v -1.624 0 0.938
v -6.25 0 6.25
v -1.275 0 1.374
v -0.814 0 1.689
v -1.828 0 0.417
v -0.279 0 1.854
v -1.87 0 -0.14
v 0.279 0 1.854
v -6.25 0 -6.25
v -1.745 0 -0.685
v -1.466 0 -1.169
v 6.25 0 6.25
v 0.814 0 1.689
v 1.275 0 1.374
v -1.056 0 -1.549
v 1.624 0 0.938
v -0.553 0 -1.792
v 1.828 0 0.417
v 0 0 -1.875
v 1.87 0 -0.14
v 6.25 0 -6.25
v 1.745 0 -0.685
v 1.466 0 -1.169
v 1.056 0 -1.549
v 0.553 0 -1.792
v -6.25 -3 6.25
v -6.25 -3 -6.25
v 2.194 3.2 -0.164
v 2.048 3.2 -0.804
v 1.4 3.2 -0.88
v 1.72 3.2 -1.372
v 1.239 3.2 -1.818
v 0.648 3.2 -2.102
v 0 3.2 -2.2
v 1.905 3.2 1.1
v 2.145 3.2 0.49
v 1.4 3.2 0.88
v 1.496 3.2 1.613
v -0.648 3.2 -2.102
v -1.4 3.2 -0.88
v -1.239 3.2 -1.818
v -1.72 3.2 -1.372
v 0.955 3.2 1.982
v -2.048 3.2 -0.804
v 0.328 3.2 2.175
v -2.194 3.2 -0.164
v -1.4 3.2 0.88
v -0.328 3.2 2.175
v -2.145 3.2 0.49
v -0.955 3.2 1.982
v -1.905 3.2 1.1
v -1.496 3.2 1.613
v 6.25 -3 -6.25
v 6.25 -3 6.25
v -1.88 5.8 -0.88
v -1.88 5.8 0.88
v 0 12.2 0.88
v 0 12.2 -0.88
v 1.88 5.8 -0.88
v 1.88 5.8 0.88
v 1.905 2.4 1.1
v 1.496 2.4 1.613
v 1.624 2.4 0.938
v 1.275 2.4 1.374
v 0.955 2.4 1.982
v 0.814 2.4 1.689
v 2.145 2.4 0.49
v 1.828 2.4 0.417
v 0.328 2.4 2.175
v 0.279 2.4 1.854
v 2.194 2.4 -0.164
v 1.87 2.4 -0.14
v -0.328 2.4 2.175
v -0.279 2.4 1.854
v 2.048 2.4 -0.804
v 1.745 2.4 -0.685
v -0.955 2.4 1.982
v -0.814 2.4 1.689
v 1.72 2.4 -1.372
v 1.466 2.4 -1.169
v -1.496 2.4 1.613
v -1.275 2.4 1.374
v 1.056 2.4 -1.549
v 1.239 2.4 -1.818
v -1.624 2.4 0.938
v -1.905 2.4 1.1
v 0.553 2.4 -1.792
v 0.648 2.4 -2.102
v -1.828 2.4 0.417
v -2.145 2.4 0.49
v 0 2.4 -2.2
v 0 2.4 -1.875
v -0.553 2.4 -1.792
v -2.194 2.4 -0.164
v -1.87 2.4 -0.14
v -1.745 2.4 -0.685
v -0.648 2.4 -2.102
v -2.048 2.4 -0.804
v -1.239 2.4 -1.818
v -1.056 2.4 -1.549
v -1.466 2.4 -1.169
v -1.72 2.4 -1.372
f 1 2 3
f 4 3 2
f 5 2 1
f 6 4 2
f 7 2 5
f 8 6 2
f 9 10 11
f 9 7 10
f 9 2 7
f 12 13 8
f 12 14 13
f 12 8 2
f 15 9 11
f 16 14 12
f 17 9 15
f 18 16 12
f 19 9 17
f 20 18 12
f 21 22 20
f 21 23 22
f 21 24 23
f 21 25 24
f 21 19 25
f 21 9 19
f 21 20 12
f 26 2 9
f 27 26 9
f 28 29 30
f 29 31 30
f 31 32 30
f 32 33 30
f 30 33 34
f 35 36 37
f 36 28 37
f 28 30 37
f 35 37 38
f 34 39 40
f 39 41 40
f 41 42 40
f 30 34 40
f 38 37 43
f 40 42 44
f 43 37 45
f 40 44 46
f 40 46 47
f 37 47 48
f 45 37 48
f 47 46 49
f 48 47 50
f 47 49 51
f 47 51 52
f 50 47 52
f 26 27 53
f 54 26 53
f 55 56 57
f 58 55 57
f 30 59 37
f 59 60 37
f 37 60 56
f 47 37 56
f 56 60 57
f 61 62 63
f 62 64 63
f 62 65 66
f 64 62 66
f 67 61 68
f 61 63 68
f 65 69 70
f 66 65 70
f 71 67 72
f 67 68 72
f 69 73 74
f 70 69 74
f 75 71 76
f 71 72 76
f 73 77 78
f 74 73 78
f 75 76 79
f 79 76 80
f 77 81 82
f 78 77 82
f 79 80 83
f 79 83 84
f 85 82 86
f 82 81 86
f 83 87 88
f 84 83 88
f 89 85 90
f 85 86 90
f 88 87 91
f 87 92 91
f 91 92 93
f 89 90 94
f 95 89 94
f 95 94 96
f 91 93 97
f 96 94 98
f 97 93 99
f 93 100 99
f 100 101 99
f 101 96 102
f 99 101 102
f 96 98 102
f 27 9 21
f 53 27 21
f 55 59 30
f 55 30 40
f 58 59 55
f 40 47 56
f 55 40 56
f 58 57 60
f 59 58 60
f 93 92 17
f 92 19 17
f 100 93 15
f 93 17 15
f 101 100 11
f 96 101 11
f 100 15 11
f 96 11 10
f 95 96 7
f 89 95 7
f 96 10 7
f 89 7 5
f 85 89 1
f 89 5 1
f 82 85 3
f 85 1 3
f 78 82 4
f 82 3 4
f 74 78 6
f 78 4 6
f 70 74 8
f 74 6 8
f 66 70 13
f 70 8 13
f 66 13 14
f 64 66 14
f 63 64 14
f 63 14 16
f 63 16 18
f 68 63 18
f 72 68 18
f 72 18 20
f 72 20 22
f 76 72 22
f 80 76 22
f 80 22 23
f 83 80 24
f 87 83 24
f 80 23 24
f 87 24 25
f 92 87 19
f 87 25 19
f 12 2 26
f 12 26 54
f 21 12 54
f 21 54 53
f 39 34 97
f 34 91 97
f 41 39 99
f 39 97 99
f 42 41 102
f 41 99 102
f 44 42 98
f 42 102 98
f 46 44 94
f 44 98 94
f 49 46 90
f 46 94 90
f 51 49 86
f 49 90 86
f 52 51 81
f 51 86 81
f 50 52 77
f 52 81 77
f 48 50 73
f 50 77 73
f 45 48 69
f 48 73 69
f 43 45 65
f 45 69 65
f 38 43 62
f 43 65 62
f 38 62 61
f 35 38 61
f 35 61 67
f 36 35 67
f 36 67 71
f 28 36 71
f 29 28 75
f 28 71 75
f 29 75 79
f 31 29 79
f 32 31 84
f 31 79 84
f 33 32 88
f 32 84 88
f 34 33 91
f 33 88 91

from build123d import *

# Parameters (mm, degrees)
SKETCH2_W           = 12.5
SKETCH2_H           = 12.5
BOSS_EXTRUDE1_DEPTH = 3
BOSS_EXTRUDE2_DEPTH = 0.88


with BuildPart() as part:
    # Sketch2 → Boss-Extrude1 (new body)
    with BuildSketch(Plane(origin=(0, 0, 0), x_dir=(1, 0, 0), z_dir=(0, 1, 0))):
        Rectangle(SKETCH2_W, SKETCH2_H)
    extrude(amount=-BOSS_EXTRUDE1_DEPTH)

    # Sketch3 → Revolve1 (revolve)
    with BuildSketch(Plane.XY, mode=Mode.PRIVATE) as revolve1_sk:
        Polygon((0, 3.2), (2.2, 3.2), (2.2, 2.4), (1.875, 2.4), (1.875, 0), (0, 0), align=None)
    revolve(revolve1_sk.sketch.rotate(Axis((0, -3, 0), (0, 1, 0)), 90), axis=Axis((0, -3, 0), (0, 1, 0)))

    # Sketch4 → Boss-Extrude2 (add, symmetric)
    with BuildSketch(Plane.XY):
        Polygon((0, 12.2), (1.88, 5.8), (1.4, 3.2), (-1.4, 3.2), (-1.88, 5.8), align=None)
    extrude(amount=BOSS_EXTRUDE2_DEPTH, both=True)


solid = part.part
